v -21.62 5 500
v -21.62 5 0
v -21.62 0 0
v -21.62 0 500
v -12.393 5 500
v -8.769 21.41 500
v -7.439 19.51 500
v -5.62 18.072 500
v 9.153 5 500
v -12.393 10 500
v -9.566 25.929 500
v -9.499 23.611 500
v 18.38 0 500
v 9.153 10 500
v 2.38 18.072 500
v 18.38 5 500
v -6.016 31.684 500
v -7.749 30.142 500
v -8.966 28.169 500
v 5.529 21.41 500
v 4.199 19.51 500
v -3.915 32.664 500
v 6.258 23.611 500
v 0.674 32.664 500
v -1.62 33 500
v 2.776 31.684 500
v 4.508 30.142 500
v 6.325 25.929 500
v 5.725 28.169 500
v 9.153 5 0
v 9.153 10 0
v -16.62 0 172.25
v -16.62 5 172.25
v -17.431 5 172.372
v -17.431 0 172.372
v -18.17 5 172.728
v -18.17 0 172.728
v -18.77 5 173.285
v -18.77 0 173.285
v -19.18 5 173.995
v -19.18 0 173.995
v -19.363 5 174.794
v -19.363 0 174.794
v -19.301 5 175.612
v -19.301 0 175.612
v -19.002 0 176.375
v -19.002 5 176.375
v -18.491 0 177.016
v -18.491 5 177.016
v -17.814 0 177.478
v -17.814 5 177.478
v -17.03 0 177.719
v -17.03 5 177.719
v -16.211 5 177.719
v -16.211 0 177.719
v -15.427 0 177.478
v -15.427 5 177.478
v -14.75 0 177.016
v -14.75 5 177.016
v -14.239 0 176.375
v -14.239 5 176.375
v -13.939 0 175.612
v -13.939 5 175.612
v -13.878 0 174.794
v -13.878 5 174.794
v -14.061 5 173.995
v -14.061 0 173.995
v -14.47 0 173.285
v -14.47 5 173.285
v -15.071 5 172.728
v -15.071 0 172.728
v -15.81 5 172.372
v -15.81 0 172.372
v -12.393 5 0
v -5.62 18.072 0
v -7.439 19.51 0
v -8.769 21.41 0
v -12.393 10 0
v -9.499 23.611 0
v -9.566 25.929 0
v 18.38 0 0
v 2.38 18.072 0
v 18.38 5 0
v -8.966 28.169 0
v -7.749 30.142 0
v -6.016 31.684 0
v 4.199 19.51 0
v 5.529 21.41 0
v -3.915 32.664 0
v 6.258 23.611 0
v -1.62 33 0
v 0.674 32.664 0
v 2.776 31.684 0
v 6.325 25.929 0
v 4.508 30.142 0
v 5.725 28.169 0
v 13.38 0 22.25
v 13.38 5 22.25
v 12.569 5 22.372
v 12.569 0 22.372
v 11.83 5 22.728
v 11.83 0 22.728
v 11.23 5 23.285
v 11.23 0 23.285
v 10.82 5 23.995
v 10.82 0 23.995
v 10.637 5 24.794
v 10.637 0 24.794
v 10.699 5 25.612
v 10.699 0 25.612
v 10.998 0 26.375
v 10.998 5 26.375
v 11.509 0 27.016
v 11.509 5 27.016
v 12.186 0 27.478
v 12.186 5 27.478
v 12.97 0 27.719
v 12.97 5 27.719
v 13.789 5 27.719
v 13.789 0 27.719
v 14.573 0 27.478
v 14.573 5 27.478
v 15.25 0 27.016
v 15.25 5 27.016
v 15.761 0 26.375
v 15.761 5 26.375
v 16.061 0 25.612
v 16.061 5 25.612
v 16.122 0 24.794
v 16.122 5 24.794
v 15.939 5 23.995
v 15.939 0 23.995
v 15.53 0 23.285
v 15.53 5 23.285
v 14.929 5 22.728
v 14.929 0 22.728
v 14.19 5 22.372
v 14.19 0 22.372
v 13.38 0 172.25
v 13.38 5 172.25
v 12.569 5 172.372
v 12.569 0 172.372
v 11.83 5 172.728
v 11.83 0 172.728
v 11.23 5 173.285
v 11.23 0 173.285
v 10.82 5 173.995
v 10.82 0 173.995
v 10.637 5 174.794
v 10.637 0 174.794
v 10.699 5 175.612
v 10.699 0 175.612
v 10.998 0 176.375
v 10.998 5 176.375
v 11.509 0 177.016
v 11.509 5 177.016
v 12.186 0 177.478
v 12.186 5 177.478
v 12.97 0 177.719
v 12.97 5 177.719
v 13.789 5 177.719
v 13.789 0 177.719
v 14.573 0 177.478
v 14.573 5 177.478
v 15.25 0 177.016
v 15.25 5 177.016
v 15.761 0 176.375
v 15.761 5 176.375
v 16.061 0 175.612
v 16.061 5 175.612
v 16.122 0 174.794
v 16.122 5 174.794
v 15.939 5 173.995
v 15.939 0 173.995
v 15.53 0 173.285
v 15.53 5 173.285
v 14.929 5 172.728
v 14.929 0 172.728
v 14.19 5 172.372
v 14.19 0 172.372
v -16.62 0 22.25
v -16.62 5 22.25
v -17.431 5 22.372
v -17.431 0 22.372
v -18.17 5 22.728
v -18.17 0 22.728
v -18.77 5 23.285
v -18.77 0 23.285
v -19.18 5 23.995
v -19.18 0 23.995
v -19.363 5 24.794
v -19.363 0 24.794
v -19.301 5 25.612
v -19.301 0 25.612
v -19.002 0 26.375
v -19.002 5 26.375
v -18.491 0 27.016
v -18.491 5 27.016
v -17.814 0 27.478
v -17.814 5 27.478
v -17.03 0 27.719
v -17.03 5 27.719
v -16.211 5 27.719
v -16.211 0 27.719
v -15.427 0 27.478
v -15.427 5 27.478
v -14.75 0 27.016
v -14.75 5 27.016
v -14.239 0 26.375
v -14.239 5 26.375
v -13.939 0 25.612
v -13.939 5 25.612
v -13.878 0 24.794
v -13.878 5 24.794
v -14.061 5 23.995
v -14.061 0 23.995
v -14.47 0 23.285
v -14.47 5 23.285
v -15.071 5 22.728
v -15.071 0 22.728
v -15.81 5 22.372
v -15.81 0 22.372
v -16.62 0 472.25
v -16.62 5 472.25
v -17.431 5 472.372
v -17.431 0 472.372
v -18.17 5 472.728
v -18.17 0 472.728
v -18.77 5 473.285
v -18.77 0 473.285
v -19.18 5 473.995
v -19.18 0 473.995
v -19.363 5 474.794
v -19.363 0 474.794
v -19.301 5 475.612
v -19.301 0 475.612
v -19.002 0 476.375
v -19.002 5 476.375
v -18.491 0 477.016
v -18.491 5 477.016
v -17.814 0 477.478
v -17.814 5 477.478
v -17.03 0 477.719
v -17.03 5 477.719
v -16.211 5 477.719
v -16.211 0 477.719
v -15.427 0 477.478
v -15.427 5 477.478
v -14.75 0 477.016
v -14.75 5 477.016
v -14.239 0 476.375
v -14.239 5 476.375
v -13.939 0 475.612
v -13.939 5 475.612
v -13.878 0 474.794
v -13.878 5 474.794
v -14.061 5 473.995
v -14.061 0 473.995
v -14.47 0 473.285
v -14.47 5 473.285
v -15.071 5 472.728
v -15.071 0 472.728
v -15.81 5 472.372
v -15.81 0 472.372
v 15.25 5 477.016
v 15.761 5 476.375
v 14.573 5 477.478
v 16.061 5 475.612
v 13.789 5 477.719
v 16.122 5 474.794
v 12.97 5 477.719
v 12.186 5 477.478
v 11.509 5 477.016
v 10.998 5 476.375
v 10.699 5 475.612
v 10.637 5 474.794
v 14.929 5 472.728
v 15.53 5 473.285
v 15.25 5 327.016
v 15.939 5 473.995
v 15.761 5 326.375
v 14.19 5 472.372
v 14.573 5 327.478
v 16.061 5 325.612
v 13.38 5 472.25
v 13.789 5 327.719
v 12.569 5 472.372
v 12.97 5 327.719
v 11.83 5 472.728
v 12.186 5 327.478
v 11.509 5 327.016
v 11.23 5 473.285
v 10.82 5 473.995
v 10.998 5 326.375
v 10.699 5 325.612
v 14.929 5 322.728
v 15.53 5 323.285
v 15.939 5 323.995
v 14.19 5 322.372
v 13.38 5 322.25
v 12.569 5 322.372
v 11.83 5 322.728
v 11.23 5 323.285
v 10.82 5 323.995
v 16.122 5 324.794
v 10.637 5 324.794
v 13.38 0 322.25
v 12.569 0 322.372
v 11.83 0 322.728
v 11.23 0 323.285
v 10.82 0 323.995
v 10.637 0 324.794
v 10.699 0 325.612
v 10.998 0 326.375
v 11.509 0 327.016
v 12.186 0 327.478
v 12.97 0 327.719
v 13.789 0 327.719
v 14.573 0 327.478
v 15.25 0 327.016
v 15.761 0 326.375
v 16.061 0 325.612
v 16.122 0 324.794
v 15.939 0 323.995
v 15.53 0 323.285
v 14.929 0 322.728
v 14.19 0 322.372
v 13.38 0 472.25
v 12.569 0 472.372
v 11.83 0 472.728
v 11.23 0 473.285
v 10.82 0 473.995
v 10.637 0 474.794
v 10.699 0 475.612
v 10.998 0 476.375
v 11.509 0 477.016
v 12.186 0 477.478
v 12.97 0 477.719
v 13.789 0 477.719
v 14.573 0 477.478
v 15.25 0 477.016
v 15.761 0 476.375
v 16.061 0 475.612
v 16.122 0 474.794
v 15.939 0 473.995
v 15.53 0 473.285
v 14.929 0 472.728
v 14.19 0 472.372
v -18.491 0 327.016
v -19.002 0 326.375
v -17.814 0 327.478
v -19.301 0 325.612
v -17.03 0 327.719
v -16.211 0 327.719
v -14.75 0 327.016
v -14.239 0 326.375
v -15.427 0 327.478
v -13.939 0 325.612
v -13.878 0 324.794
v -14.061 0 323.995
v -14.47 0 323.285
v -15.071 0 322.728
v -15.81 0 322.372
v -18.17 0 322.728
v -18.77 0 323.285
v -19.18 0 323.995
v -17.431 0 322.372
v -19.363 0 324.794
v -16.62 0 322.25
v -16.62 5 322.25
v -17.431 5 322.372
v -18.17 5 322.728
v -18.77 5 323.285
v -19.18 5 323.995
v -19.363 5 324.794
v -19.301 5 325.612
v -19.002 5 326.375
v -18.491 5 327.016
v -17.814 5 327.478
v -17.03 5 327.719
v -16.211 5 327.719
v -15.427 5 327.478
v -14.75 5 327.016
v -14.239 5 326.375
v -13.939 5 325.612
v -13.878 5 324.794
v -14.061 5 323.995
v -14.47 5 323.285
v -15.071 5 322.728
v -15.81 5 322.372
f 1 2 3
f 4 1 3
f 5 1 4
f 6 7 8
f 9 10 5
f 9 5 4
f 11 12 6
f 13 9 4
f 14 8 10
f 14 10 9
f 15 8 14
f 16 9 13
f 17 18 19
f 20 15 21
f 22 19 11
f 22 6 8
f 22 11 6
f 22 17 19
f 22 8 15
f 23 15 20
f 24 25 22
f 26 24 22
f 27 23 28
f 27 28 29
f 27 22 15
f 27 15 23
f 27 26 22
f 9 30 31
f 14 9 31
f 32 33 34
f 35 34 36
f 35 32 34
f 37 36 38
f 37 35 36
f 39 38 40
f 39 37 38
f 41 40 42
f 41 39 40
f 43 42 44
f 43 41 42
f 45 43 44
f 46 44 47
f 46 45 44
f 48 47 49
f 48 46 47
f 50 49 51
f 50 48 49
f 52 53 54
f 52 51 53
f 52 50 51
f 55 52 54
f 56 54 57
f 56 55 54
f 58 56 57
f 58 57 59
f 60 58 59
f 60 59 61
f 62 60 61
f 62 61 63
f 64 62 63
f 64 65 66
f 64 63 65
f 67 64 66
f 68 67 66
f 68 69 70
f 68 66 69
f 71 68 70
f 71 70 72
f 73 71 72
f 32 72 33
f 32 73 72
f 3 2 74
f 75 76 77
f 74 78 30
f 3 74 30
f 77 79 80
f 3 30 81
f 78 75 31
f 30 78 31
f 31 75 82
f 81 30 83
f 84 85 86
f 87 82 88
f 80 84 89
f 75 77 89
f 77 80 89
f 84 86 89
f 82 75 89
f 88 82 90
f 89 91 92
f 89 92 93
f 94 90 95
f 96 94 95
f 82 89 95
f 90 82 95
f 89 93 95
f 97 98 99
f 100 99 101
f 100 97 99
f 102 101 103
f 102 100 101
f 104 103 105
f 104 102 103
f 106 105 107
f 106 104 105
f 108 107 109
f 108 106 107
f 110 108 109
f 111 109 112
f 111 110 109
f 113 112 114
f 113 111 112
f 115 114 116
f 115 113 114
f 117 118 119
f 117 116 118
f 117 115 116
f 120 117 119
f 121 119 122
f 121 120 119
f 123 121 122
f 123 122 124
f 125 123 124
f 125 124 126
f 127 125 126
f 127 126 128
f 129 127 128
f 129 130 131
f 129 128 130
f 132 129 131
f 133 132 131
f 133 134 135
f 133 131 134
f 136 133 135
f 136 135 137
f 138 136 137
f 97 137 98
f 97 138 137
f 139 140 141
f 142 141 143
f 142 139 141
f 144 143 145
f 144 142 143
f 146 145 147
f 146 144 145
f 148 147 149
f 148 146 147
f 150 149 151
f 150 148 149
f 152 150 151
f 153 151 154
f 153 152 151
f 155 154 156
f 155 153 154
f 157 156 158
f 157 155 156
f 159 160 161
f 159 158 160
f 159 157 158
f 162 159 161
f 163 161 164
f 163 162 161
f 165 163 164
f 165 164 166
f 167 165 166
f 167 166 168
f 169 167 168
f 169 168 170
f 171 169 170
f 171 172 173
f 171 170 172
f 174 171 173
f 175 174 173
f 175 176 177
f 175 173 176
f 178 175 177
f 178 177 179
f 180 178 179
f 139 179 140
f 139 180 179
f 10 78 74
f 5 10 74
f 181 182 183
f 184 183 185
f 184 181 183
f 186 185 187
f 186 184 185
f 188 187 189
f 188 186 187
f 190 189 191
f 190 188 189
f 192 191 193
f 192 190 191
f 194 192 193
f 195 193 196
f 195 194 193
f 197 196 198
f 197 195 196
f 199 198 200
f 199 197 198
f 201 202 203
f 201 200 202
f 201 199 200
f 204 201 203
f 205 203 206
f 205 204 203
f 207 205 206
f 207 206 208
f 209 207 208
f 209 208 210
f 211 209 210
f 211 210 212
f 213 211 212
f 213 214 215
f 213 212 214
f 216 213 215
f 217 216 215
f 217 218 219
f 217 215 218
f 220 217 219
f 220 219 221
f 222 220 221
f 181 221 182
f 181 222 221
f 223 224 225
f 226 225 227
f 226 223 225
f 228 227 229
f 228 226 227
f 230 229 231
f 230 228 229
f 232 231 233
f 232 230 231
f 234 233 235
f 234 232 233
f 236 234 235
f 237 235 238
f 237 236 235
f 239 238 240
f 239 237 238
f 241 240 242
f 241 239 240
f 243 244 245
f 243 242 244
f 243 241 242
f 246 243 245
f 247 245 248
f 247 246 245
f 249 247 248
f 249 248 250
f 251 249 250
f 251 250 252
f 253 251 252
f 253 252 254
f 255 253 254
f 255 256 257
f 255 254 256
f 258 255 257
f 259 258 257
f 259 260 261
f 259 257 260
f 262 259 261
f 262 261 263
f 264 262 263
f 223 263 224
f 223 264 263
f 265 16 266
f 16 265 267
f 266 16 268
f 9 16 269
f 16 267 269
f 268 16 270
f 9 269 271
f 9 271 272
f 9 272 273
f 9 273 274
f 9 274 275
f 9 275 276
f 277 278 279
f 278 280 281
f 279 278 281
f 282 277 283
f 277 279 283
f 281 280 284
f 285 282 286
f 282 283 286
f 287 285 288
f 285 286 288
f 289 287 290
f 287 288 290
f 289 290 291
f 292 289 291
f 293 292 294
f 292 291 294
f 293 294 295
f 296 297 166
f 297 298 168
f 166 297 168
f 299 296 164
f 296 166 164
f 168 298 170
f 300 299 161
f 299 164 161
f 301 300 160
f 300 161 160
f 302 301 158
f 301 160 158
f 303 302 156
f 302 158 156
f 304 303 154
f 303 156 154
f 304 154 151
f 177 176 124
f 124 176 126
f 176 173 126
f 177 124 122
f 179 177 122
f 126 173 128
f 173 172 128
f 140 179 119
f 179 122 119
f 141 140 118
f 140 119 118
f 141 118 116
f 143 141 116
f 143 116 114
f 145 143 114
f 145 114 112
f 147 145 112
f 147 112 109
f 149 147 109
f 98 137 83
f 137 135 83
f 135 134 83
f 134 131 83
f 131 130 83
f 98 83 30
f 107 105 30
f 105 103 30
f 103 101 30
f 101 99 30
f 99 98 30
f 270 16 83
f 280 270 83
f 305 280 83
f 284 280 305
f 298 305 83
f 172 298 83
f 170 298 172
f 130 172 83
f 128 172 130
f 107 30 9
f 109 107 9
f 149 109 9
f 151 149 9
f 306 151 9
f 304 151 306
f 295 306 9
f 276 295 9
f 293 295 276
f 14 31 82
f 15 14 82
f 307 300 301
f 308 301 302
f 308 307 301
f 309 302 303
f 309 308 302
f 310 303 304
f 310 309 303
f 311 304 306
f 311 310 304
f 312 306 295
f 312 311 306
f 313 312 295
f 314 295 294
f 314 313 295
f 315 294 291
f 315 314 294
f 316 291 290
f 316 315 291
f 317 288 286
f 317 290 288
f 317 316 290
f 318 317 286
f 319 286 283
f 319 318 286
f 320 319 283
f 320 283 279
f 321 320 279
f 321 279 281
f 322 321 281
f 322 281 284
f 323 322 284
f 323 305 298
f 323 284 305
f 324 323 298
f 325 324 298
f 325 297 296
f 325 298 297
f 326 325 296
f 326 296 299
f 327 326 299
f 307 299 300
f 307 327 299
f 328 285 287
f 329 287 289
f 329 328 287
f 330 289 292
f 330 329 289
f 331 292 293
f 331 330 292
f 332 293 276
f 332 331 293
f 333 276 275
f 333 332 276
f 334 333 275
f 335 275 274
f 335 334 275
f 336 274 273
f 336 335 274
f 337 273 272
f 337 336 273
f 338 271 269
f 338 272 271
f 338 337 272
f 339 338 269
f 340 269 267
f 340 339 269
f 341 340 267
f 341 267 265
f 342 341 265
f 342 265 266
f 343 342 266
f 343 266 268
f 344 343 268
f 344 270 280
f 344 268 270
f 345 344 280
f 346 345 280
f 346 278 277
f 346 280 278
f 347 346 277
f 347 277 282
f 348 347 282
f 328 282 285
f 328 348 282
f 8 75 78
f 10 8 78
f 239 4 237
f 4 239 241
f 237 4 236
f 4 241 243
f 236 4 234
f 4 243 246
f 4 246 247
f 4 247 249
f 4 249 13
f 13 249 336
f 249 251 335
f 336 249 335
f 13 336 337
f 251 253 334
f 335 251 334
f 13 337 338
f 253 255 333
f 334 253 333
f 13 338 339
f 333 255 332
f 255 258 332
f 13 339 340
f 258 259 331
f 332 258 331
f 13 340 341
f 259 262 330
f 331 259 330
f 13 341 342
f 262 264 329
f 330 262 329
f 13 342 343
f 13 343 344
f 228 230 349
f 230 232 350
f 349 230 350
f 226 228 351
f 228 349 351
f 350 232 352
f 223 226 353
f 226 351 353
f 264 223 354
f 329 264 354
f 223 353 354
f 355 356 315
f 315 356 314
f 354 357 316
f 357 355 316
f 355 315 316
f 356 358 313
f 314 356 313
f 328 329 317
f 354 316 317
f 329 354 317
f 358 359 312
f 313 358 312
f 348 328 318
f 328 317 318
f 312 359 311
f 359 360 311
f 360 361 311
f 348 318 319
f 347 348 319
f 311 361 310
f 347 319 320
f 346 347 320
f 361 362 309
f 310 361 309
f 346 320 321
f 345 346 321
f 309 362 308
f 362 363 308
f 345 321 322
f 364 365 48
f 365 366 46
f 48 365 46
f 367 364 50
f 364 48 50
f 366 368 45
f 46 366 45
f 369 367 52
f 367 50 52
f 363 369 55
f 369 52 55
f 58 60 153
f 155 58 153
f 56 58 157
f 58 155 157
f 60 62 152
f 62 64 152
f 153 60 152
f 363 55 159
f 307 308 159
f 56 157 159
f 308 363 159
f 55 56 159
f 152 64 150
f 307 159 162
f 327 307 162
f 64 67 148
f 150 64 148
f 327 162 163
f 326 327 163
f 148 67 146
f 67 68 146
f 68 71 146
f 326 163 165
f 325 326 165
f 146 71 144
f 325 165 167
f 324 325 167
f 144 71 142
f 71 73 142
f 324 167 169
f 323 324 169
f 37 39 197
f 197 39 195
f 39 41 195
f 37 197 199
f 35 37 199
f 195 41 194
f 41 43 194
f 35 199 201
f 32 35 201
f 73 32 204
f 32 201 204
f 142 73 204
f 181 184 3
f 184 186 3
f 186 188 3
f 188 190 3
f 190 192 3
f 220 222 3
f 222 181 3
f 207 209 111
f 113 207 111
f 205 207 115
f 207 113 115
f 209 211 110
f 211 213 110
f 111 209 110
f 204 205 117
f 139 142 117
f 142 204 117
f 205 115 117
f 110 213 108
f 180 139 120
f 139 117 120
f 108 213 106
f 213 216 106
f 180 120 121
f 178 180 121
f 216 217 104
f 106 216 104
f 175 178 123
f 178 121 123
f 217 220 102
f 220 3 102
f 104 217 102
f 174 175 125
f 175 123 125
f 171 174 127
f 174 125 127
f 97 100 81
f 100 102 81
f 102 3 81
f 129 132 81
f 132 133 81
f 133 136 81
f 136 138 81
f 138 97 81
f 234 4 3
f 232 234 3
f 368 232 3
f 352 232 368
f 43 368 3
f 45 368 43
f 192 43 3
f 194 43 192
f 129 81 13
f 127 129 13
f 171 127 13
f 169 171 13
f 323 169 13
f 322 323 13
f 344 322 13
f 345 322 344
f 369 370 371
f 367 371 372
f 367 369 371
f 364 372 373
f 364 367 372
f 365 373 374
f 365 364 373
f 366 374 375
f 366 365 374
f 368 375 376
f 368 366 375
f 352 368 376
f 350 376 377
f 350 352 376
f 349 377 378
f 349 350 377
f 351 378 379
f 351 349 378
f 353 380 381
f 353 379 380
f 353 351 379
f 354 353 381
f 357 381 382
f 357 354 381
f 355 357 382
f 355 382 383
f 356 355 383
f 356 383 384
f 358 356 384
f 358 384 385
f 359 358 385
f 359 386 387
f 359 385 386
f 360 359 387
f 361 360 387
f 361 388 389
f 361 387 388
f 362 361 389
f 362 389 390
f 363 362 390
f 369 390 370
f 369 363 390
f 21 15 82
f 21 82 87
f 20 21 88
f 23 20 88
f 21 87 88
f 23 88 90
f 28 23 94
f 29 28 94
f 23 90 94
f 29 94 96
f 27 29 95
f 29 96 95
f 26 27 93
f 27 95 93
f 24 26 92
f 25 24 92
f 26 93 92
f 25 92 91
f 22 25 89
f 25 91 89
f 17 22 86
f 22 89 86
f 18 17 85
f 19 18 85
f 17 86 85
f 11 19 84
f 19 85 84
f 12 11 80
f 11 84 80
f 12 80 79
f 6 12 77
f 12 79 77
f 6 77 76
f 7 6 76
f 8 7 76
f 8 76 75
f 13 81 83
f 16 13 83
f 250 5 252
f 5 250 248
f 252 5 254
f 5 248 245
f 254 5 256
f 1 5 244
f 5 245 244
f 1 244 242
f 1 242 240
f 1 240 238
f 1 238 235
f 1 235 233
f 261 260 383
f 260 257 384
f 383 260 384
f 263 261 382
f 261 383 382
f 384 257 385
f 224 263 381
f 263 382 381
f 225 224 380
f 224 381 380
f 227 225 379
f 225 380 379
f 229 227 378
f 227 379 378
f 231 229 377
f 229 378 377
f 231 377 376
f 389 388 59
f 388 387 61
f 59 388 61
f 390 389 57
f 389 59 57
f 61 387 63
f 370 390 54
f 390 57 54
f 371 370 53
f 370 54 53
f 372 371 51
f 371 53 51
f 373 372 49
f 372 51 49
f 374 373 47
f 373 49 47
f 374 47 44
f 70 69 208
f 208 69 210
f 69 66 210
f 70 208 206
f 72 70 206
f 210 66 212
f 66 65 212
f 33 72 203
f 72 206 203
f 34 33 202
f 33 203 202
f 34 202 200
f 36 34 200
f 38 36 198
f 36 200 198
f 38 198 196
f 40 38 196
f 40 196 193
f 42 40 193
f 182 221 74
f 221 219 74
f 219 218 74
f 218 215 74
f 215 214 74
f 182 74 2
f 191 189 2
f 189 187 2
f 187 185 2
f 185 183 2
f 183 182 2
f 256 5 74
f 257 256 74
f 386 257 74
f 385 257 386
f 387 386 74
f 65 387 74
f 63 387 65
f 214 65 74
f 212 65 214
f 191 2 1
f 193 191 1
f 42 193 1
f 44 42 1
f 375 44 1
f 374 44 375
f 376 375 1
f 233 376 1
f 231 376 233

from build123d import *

# Parameters (mm, degrees)
BOSS_EXTRUDE1_DEPTH = 500
SKETCH2_R           = 2.75
CUT_EXTRUDE1_DEPTH  = 502.554026994


with BuildPart() as part:
    # Sketch1 → Boss-Extrude1 (new body)
    with BuildSketch(Plane.XY):
        with BuildLine():
            Line((-21.620406895, 0), (18.379593105, 0))
            Line((18.379593105, 0), (18.379593105, 5))
            Line((18.379593105, 5), (9.152634797, 5))
            Line((9.152634797, 5), (9.152634797, 10))
            Line((9.152634797, 10), (2.379593105, 18.07179677))
            ThreePointArc((2.379593105, 18.07179677), (-1.620406895, 33), (-5.620406895, 18.07179677))
            Line((-5.620406895, 18.07179677), (-12.393448588, 10))
            Line((-12.393448588, 10), (-12.393448588, 5))
            Line((-12.393448588, 5), (-21.620406895, 5))
            Line((-21.620406895, 5), (-21.620406895, 0))
        make_face()
    extrude(amount=BOSS_EXTRUDE1_DEPTH)

    # Sketch2 → Cut-Extrude1 (cut, through all)
    with BuildSketch(Plane(origin=(0, 0, 0), x_dir=(1, 0, 0), z_dir=(0, 1, 0))):
        with Locations(Location((-16.620406895, -475, 0), (0, 0, 90))):
            Circle(SKETCH2_R)
        with Locations(Location((13.379593105, -475, 0), (0, 0, 90))):
            Circle(SKETCH2_R)
        with Locations(Location((-16.620406895, -325, 0), (0, 0, 90))):
            Circle(SKETCH2_R)
        with Locations(Location((13.379593105, -325, 0), (0, 0, 90))):
            Circle(SKETCH2_R)
        with Locations(Location((-16.620406895, -175, 0), (0, 0, 90))):
            Circle(SKETCH2_R)
        with Locations(Location((13.379593105, -175, 0), (0, 0, 90))):
            Circle(SKETCH2_R)
        with Locations(Location((-16.620406895, -25, 0), (0, 0, 90))):
            Circle(SKETCH2_R)
        with Locations(Location((13.379593105, -25, 0), (0, 0, 90))):
            Circle(SKETCH2_R)
    extrude(amount=CUT_EXTRUDE1_DEPTH, mode=Mode.SUBTRACT)


solid = part.part
